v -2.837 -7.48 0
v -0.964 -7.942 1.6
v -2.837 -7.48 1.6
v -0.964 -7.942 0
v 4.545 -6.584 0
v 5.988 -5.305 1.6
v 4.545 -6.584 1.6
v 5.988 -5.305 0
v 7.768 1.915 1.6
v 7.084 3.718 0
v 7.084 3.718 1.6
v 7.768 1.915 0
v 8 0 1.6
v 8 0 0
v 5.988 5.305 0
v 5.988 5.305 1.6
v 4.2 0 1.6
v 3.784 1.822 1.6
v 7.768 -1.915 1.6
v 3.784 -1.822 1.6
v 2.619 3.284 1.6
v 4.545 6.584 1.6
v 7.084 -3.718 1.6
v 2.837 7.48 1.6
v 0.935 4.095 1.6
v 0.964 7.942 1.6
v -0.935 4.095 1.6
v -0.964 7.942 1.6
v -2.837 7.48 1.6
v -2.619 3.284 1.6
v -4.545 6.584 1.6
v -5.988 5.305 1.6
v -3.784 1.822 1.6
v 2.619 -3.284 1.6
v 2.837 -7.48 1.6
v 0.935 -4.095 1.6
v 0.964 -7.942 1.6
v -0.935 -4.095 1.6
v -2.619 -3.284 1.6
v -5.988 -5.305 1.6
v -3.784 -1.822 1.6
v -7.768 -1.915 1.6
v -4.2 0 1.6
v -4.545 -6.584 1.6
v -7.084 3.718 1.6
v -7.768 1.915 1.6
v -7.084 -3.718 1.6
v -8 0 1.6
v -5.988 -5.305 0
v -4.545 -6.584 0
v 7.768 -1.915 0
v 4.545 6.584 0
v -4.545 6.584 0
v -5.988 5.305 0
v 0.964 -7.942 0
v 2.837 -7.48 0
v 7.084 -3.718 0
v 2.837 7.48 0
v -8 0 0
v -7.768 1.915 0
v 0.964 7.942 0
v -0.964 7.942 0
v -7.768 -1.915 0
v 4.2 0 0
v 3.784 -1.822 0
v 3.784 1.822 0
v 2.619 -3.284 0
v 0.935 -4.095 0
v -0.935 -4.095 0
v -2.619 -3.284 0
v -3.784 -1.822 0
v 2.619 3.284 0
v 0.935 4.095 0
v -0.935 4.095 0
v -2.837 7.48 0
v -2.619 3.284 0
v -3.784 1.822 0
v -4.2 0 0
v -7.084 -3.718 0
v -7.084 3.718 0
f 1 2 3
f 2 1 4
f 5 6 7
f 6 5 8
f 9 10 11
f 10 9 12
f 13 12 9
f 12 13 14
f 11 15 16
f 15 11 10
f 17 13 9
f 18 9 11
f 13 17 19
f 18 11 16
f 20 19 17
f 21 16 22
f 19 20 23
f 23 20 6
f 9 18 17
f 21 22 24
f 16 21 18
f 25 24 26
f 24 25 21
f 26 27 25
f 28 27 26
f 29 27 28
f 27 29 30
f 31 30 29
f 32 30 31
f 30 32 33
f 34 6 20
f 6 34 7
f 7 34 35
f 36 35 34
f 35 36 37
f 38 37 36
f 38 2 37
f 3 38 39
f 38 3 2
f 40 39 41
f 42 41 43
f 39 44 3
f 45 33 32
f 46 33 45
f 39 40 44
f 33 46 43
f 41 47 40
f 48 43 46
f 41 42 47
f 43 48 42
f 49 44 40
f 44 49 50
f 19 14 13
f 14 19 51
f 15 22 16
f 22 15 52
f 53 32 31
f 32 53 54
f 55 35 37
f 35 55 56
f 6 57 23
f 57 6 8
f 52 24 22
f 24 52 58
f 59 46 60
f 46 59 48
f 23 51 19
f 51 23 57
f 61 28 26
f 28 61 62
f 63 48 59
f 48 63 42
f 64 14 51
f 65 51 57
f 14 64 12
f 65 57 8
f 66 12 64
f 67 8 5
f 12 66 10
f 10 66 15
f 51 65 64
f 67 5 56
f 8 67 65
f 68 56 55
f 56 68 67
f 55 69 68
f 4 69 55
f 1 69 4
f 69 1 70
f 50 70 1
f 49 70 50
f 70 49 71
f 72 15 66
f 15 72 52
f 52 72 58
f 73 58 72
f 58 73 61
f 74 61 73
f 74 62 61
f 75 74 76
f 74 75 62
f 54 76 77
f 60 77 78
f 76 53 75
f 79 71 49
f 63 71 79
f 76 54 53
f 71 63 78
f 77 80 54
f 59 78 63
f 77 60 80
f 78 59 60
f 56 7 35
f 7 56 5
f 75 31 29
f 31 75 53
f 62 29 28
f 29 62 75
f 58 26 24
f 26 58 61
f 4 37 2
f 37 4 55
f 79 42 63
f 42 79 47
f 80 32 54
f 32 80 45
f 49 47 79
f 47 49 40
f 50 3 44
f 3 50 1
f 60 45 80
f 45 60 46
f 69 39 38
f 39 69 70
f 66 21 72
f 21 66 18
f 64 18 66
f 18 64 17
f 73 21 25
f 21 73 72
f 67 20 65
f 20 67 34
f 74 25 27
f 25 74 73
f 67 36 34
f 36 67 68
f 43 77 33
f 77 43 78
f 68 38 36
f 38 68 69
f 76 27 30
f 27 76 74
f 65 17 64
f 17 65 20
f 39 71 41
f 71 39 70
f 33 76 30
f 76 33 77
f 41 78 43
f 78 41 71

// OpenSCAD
// Parameters
outer_diameter_mm = 16; //[8:32:0.1]
inner_diameter_mm = 8.4; //[4.2:16.8:0.05]
thickness_mm = 1.6; //[0.8:3.2:0.05]
centered = 1; //[0:1:1]
eps_mm = 0.2; //[0.05:0.5:0.05]

// Washer geometry
module washer_body() {
  difference() {
    // Outer cylinder
    cylinder(r=outer_diameter_mm/2, h=thickness_mm, center=centered);
    // Inner hole
    cylinder(r=inner_diameter_mm/2, h=thickness_mm + 2*eps_mm, center=centered);
  }
}

// Render the washer
washer_body();
